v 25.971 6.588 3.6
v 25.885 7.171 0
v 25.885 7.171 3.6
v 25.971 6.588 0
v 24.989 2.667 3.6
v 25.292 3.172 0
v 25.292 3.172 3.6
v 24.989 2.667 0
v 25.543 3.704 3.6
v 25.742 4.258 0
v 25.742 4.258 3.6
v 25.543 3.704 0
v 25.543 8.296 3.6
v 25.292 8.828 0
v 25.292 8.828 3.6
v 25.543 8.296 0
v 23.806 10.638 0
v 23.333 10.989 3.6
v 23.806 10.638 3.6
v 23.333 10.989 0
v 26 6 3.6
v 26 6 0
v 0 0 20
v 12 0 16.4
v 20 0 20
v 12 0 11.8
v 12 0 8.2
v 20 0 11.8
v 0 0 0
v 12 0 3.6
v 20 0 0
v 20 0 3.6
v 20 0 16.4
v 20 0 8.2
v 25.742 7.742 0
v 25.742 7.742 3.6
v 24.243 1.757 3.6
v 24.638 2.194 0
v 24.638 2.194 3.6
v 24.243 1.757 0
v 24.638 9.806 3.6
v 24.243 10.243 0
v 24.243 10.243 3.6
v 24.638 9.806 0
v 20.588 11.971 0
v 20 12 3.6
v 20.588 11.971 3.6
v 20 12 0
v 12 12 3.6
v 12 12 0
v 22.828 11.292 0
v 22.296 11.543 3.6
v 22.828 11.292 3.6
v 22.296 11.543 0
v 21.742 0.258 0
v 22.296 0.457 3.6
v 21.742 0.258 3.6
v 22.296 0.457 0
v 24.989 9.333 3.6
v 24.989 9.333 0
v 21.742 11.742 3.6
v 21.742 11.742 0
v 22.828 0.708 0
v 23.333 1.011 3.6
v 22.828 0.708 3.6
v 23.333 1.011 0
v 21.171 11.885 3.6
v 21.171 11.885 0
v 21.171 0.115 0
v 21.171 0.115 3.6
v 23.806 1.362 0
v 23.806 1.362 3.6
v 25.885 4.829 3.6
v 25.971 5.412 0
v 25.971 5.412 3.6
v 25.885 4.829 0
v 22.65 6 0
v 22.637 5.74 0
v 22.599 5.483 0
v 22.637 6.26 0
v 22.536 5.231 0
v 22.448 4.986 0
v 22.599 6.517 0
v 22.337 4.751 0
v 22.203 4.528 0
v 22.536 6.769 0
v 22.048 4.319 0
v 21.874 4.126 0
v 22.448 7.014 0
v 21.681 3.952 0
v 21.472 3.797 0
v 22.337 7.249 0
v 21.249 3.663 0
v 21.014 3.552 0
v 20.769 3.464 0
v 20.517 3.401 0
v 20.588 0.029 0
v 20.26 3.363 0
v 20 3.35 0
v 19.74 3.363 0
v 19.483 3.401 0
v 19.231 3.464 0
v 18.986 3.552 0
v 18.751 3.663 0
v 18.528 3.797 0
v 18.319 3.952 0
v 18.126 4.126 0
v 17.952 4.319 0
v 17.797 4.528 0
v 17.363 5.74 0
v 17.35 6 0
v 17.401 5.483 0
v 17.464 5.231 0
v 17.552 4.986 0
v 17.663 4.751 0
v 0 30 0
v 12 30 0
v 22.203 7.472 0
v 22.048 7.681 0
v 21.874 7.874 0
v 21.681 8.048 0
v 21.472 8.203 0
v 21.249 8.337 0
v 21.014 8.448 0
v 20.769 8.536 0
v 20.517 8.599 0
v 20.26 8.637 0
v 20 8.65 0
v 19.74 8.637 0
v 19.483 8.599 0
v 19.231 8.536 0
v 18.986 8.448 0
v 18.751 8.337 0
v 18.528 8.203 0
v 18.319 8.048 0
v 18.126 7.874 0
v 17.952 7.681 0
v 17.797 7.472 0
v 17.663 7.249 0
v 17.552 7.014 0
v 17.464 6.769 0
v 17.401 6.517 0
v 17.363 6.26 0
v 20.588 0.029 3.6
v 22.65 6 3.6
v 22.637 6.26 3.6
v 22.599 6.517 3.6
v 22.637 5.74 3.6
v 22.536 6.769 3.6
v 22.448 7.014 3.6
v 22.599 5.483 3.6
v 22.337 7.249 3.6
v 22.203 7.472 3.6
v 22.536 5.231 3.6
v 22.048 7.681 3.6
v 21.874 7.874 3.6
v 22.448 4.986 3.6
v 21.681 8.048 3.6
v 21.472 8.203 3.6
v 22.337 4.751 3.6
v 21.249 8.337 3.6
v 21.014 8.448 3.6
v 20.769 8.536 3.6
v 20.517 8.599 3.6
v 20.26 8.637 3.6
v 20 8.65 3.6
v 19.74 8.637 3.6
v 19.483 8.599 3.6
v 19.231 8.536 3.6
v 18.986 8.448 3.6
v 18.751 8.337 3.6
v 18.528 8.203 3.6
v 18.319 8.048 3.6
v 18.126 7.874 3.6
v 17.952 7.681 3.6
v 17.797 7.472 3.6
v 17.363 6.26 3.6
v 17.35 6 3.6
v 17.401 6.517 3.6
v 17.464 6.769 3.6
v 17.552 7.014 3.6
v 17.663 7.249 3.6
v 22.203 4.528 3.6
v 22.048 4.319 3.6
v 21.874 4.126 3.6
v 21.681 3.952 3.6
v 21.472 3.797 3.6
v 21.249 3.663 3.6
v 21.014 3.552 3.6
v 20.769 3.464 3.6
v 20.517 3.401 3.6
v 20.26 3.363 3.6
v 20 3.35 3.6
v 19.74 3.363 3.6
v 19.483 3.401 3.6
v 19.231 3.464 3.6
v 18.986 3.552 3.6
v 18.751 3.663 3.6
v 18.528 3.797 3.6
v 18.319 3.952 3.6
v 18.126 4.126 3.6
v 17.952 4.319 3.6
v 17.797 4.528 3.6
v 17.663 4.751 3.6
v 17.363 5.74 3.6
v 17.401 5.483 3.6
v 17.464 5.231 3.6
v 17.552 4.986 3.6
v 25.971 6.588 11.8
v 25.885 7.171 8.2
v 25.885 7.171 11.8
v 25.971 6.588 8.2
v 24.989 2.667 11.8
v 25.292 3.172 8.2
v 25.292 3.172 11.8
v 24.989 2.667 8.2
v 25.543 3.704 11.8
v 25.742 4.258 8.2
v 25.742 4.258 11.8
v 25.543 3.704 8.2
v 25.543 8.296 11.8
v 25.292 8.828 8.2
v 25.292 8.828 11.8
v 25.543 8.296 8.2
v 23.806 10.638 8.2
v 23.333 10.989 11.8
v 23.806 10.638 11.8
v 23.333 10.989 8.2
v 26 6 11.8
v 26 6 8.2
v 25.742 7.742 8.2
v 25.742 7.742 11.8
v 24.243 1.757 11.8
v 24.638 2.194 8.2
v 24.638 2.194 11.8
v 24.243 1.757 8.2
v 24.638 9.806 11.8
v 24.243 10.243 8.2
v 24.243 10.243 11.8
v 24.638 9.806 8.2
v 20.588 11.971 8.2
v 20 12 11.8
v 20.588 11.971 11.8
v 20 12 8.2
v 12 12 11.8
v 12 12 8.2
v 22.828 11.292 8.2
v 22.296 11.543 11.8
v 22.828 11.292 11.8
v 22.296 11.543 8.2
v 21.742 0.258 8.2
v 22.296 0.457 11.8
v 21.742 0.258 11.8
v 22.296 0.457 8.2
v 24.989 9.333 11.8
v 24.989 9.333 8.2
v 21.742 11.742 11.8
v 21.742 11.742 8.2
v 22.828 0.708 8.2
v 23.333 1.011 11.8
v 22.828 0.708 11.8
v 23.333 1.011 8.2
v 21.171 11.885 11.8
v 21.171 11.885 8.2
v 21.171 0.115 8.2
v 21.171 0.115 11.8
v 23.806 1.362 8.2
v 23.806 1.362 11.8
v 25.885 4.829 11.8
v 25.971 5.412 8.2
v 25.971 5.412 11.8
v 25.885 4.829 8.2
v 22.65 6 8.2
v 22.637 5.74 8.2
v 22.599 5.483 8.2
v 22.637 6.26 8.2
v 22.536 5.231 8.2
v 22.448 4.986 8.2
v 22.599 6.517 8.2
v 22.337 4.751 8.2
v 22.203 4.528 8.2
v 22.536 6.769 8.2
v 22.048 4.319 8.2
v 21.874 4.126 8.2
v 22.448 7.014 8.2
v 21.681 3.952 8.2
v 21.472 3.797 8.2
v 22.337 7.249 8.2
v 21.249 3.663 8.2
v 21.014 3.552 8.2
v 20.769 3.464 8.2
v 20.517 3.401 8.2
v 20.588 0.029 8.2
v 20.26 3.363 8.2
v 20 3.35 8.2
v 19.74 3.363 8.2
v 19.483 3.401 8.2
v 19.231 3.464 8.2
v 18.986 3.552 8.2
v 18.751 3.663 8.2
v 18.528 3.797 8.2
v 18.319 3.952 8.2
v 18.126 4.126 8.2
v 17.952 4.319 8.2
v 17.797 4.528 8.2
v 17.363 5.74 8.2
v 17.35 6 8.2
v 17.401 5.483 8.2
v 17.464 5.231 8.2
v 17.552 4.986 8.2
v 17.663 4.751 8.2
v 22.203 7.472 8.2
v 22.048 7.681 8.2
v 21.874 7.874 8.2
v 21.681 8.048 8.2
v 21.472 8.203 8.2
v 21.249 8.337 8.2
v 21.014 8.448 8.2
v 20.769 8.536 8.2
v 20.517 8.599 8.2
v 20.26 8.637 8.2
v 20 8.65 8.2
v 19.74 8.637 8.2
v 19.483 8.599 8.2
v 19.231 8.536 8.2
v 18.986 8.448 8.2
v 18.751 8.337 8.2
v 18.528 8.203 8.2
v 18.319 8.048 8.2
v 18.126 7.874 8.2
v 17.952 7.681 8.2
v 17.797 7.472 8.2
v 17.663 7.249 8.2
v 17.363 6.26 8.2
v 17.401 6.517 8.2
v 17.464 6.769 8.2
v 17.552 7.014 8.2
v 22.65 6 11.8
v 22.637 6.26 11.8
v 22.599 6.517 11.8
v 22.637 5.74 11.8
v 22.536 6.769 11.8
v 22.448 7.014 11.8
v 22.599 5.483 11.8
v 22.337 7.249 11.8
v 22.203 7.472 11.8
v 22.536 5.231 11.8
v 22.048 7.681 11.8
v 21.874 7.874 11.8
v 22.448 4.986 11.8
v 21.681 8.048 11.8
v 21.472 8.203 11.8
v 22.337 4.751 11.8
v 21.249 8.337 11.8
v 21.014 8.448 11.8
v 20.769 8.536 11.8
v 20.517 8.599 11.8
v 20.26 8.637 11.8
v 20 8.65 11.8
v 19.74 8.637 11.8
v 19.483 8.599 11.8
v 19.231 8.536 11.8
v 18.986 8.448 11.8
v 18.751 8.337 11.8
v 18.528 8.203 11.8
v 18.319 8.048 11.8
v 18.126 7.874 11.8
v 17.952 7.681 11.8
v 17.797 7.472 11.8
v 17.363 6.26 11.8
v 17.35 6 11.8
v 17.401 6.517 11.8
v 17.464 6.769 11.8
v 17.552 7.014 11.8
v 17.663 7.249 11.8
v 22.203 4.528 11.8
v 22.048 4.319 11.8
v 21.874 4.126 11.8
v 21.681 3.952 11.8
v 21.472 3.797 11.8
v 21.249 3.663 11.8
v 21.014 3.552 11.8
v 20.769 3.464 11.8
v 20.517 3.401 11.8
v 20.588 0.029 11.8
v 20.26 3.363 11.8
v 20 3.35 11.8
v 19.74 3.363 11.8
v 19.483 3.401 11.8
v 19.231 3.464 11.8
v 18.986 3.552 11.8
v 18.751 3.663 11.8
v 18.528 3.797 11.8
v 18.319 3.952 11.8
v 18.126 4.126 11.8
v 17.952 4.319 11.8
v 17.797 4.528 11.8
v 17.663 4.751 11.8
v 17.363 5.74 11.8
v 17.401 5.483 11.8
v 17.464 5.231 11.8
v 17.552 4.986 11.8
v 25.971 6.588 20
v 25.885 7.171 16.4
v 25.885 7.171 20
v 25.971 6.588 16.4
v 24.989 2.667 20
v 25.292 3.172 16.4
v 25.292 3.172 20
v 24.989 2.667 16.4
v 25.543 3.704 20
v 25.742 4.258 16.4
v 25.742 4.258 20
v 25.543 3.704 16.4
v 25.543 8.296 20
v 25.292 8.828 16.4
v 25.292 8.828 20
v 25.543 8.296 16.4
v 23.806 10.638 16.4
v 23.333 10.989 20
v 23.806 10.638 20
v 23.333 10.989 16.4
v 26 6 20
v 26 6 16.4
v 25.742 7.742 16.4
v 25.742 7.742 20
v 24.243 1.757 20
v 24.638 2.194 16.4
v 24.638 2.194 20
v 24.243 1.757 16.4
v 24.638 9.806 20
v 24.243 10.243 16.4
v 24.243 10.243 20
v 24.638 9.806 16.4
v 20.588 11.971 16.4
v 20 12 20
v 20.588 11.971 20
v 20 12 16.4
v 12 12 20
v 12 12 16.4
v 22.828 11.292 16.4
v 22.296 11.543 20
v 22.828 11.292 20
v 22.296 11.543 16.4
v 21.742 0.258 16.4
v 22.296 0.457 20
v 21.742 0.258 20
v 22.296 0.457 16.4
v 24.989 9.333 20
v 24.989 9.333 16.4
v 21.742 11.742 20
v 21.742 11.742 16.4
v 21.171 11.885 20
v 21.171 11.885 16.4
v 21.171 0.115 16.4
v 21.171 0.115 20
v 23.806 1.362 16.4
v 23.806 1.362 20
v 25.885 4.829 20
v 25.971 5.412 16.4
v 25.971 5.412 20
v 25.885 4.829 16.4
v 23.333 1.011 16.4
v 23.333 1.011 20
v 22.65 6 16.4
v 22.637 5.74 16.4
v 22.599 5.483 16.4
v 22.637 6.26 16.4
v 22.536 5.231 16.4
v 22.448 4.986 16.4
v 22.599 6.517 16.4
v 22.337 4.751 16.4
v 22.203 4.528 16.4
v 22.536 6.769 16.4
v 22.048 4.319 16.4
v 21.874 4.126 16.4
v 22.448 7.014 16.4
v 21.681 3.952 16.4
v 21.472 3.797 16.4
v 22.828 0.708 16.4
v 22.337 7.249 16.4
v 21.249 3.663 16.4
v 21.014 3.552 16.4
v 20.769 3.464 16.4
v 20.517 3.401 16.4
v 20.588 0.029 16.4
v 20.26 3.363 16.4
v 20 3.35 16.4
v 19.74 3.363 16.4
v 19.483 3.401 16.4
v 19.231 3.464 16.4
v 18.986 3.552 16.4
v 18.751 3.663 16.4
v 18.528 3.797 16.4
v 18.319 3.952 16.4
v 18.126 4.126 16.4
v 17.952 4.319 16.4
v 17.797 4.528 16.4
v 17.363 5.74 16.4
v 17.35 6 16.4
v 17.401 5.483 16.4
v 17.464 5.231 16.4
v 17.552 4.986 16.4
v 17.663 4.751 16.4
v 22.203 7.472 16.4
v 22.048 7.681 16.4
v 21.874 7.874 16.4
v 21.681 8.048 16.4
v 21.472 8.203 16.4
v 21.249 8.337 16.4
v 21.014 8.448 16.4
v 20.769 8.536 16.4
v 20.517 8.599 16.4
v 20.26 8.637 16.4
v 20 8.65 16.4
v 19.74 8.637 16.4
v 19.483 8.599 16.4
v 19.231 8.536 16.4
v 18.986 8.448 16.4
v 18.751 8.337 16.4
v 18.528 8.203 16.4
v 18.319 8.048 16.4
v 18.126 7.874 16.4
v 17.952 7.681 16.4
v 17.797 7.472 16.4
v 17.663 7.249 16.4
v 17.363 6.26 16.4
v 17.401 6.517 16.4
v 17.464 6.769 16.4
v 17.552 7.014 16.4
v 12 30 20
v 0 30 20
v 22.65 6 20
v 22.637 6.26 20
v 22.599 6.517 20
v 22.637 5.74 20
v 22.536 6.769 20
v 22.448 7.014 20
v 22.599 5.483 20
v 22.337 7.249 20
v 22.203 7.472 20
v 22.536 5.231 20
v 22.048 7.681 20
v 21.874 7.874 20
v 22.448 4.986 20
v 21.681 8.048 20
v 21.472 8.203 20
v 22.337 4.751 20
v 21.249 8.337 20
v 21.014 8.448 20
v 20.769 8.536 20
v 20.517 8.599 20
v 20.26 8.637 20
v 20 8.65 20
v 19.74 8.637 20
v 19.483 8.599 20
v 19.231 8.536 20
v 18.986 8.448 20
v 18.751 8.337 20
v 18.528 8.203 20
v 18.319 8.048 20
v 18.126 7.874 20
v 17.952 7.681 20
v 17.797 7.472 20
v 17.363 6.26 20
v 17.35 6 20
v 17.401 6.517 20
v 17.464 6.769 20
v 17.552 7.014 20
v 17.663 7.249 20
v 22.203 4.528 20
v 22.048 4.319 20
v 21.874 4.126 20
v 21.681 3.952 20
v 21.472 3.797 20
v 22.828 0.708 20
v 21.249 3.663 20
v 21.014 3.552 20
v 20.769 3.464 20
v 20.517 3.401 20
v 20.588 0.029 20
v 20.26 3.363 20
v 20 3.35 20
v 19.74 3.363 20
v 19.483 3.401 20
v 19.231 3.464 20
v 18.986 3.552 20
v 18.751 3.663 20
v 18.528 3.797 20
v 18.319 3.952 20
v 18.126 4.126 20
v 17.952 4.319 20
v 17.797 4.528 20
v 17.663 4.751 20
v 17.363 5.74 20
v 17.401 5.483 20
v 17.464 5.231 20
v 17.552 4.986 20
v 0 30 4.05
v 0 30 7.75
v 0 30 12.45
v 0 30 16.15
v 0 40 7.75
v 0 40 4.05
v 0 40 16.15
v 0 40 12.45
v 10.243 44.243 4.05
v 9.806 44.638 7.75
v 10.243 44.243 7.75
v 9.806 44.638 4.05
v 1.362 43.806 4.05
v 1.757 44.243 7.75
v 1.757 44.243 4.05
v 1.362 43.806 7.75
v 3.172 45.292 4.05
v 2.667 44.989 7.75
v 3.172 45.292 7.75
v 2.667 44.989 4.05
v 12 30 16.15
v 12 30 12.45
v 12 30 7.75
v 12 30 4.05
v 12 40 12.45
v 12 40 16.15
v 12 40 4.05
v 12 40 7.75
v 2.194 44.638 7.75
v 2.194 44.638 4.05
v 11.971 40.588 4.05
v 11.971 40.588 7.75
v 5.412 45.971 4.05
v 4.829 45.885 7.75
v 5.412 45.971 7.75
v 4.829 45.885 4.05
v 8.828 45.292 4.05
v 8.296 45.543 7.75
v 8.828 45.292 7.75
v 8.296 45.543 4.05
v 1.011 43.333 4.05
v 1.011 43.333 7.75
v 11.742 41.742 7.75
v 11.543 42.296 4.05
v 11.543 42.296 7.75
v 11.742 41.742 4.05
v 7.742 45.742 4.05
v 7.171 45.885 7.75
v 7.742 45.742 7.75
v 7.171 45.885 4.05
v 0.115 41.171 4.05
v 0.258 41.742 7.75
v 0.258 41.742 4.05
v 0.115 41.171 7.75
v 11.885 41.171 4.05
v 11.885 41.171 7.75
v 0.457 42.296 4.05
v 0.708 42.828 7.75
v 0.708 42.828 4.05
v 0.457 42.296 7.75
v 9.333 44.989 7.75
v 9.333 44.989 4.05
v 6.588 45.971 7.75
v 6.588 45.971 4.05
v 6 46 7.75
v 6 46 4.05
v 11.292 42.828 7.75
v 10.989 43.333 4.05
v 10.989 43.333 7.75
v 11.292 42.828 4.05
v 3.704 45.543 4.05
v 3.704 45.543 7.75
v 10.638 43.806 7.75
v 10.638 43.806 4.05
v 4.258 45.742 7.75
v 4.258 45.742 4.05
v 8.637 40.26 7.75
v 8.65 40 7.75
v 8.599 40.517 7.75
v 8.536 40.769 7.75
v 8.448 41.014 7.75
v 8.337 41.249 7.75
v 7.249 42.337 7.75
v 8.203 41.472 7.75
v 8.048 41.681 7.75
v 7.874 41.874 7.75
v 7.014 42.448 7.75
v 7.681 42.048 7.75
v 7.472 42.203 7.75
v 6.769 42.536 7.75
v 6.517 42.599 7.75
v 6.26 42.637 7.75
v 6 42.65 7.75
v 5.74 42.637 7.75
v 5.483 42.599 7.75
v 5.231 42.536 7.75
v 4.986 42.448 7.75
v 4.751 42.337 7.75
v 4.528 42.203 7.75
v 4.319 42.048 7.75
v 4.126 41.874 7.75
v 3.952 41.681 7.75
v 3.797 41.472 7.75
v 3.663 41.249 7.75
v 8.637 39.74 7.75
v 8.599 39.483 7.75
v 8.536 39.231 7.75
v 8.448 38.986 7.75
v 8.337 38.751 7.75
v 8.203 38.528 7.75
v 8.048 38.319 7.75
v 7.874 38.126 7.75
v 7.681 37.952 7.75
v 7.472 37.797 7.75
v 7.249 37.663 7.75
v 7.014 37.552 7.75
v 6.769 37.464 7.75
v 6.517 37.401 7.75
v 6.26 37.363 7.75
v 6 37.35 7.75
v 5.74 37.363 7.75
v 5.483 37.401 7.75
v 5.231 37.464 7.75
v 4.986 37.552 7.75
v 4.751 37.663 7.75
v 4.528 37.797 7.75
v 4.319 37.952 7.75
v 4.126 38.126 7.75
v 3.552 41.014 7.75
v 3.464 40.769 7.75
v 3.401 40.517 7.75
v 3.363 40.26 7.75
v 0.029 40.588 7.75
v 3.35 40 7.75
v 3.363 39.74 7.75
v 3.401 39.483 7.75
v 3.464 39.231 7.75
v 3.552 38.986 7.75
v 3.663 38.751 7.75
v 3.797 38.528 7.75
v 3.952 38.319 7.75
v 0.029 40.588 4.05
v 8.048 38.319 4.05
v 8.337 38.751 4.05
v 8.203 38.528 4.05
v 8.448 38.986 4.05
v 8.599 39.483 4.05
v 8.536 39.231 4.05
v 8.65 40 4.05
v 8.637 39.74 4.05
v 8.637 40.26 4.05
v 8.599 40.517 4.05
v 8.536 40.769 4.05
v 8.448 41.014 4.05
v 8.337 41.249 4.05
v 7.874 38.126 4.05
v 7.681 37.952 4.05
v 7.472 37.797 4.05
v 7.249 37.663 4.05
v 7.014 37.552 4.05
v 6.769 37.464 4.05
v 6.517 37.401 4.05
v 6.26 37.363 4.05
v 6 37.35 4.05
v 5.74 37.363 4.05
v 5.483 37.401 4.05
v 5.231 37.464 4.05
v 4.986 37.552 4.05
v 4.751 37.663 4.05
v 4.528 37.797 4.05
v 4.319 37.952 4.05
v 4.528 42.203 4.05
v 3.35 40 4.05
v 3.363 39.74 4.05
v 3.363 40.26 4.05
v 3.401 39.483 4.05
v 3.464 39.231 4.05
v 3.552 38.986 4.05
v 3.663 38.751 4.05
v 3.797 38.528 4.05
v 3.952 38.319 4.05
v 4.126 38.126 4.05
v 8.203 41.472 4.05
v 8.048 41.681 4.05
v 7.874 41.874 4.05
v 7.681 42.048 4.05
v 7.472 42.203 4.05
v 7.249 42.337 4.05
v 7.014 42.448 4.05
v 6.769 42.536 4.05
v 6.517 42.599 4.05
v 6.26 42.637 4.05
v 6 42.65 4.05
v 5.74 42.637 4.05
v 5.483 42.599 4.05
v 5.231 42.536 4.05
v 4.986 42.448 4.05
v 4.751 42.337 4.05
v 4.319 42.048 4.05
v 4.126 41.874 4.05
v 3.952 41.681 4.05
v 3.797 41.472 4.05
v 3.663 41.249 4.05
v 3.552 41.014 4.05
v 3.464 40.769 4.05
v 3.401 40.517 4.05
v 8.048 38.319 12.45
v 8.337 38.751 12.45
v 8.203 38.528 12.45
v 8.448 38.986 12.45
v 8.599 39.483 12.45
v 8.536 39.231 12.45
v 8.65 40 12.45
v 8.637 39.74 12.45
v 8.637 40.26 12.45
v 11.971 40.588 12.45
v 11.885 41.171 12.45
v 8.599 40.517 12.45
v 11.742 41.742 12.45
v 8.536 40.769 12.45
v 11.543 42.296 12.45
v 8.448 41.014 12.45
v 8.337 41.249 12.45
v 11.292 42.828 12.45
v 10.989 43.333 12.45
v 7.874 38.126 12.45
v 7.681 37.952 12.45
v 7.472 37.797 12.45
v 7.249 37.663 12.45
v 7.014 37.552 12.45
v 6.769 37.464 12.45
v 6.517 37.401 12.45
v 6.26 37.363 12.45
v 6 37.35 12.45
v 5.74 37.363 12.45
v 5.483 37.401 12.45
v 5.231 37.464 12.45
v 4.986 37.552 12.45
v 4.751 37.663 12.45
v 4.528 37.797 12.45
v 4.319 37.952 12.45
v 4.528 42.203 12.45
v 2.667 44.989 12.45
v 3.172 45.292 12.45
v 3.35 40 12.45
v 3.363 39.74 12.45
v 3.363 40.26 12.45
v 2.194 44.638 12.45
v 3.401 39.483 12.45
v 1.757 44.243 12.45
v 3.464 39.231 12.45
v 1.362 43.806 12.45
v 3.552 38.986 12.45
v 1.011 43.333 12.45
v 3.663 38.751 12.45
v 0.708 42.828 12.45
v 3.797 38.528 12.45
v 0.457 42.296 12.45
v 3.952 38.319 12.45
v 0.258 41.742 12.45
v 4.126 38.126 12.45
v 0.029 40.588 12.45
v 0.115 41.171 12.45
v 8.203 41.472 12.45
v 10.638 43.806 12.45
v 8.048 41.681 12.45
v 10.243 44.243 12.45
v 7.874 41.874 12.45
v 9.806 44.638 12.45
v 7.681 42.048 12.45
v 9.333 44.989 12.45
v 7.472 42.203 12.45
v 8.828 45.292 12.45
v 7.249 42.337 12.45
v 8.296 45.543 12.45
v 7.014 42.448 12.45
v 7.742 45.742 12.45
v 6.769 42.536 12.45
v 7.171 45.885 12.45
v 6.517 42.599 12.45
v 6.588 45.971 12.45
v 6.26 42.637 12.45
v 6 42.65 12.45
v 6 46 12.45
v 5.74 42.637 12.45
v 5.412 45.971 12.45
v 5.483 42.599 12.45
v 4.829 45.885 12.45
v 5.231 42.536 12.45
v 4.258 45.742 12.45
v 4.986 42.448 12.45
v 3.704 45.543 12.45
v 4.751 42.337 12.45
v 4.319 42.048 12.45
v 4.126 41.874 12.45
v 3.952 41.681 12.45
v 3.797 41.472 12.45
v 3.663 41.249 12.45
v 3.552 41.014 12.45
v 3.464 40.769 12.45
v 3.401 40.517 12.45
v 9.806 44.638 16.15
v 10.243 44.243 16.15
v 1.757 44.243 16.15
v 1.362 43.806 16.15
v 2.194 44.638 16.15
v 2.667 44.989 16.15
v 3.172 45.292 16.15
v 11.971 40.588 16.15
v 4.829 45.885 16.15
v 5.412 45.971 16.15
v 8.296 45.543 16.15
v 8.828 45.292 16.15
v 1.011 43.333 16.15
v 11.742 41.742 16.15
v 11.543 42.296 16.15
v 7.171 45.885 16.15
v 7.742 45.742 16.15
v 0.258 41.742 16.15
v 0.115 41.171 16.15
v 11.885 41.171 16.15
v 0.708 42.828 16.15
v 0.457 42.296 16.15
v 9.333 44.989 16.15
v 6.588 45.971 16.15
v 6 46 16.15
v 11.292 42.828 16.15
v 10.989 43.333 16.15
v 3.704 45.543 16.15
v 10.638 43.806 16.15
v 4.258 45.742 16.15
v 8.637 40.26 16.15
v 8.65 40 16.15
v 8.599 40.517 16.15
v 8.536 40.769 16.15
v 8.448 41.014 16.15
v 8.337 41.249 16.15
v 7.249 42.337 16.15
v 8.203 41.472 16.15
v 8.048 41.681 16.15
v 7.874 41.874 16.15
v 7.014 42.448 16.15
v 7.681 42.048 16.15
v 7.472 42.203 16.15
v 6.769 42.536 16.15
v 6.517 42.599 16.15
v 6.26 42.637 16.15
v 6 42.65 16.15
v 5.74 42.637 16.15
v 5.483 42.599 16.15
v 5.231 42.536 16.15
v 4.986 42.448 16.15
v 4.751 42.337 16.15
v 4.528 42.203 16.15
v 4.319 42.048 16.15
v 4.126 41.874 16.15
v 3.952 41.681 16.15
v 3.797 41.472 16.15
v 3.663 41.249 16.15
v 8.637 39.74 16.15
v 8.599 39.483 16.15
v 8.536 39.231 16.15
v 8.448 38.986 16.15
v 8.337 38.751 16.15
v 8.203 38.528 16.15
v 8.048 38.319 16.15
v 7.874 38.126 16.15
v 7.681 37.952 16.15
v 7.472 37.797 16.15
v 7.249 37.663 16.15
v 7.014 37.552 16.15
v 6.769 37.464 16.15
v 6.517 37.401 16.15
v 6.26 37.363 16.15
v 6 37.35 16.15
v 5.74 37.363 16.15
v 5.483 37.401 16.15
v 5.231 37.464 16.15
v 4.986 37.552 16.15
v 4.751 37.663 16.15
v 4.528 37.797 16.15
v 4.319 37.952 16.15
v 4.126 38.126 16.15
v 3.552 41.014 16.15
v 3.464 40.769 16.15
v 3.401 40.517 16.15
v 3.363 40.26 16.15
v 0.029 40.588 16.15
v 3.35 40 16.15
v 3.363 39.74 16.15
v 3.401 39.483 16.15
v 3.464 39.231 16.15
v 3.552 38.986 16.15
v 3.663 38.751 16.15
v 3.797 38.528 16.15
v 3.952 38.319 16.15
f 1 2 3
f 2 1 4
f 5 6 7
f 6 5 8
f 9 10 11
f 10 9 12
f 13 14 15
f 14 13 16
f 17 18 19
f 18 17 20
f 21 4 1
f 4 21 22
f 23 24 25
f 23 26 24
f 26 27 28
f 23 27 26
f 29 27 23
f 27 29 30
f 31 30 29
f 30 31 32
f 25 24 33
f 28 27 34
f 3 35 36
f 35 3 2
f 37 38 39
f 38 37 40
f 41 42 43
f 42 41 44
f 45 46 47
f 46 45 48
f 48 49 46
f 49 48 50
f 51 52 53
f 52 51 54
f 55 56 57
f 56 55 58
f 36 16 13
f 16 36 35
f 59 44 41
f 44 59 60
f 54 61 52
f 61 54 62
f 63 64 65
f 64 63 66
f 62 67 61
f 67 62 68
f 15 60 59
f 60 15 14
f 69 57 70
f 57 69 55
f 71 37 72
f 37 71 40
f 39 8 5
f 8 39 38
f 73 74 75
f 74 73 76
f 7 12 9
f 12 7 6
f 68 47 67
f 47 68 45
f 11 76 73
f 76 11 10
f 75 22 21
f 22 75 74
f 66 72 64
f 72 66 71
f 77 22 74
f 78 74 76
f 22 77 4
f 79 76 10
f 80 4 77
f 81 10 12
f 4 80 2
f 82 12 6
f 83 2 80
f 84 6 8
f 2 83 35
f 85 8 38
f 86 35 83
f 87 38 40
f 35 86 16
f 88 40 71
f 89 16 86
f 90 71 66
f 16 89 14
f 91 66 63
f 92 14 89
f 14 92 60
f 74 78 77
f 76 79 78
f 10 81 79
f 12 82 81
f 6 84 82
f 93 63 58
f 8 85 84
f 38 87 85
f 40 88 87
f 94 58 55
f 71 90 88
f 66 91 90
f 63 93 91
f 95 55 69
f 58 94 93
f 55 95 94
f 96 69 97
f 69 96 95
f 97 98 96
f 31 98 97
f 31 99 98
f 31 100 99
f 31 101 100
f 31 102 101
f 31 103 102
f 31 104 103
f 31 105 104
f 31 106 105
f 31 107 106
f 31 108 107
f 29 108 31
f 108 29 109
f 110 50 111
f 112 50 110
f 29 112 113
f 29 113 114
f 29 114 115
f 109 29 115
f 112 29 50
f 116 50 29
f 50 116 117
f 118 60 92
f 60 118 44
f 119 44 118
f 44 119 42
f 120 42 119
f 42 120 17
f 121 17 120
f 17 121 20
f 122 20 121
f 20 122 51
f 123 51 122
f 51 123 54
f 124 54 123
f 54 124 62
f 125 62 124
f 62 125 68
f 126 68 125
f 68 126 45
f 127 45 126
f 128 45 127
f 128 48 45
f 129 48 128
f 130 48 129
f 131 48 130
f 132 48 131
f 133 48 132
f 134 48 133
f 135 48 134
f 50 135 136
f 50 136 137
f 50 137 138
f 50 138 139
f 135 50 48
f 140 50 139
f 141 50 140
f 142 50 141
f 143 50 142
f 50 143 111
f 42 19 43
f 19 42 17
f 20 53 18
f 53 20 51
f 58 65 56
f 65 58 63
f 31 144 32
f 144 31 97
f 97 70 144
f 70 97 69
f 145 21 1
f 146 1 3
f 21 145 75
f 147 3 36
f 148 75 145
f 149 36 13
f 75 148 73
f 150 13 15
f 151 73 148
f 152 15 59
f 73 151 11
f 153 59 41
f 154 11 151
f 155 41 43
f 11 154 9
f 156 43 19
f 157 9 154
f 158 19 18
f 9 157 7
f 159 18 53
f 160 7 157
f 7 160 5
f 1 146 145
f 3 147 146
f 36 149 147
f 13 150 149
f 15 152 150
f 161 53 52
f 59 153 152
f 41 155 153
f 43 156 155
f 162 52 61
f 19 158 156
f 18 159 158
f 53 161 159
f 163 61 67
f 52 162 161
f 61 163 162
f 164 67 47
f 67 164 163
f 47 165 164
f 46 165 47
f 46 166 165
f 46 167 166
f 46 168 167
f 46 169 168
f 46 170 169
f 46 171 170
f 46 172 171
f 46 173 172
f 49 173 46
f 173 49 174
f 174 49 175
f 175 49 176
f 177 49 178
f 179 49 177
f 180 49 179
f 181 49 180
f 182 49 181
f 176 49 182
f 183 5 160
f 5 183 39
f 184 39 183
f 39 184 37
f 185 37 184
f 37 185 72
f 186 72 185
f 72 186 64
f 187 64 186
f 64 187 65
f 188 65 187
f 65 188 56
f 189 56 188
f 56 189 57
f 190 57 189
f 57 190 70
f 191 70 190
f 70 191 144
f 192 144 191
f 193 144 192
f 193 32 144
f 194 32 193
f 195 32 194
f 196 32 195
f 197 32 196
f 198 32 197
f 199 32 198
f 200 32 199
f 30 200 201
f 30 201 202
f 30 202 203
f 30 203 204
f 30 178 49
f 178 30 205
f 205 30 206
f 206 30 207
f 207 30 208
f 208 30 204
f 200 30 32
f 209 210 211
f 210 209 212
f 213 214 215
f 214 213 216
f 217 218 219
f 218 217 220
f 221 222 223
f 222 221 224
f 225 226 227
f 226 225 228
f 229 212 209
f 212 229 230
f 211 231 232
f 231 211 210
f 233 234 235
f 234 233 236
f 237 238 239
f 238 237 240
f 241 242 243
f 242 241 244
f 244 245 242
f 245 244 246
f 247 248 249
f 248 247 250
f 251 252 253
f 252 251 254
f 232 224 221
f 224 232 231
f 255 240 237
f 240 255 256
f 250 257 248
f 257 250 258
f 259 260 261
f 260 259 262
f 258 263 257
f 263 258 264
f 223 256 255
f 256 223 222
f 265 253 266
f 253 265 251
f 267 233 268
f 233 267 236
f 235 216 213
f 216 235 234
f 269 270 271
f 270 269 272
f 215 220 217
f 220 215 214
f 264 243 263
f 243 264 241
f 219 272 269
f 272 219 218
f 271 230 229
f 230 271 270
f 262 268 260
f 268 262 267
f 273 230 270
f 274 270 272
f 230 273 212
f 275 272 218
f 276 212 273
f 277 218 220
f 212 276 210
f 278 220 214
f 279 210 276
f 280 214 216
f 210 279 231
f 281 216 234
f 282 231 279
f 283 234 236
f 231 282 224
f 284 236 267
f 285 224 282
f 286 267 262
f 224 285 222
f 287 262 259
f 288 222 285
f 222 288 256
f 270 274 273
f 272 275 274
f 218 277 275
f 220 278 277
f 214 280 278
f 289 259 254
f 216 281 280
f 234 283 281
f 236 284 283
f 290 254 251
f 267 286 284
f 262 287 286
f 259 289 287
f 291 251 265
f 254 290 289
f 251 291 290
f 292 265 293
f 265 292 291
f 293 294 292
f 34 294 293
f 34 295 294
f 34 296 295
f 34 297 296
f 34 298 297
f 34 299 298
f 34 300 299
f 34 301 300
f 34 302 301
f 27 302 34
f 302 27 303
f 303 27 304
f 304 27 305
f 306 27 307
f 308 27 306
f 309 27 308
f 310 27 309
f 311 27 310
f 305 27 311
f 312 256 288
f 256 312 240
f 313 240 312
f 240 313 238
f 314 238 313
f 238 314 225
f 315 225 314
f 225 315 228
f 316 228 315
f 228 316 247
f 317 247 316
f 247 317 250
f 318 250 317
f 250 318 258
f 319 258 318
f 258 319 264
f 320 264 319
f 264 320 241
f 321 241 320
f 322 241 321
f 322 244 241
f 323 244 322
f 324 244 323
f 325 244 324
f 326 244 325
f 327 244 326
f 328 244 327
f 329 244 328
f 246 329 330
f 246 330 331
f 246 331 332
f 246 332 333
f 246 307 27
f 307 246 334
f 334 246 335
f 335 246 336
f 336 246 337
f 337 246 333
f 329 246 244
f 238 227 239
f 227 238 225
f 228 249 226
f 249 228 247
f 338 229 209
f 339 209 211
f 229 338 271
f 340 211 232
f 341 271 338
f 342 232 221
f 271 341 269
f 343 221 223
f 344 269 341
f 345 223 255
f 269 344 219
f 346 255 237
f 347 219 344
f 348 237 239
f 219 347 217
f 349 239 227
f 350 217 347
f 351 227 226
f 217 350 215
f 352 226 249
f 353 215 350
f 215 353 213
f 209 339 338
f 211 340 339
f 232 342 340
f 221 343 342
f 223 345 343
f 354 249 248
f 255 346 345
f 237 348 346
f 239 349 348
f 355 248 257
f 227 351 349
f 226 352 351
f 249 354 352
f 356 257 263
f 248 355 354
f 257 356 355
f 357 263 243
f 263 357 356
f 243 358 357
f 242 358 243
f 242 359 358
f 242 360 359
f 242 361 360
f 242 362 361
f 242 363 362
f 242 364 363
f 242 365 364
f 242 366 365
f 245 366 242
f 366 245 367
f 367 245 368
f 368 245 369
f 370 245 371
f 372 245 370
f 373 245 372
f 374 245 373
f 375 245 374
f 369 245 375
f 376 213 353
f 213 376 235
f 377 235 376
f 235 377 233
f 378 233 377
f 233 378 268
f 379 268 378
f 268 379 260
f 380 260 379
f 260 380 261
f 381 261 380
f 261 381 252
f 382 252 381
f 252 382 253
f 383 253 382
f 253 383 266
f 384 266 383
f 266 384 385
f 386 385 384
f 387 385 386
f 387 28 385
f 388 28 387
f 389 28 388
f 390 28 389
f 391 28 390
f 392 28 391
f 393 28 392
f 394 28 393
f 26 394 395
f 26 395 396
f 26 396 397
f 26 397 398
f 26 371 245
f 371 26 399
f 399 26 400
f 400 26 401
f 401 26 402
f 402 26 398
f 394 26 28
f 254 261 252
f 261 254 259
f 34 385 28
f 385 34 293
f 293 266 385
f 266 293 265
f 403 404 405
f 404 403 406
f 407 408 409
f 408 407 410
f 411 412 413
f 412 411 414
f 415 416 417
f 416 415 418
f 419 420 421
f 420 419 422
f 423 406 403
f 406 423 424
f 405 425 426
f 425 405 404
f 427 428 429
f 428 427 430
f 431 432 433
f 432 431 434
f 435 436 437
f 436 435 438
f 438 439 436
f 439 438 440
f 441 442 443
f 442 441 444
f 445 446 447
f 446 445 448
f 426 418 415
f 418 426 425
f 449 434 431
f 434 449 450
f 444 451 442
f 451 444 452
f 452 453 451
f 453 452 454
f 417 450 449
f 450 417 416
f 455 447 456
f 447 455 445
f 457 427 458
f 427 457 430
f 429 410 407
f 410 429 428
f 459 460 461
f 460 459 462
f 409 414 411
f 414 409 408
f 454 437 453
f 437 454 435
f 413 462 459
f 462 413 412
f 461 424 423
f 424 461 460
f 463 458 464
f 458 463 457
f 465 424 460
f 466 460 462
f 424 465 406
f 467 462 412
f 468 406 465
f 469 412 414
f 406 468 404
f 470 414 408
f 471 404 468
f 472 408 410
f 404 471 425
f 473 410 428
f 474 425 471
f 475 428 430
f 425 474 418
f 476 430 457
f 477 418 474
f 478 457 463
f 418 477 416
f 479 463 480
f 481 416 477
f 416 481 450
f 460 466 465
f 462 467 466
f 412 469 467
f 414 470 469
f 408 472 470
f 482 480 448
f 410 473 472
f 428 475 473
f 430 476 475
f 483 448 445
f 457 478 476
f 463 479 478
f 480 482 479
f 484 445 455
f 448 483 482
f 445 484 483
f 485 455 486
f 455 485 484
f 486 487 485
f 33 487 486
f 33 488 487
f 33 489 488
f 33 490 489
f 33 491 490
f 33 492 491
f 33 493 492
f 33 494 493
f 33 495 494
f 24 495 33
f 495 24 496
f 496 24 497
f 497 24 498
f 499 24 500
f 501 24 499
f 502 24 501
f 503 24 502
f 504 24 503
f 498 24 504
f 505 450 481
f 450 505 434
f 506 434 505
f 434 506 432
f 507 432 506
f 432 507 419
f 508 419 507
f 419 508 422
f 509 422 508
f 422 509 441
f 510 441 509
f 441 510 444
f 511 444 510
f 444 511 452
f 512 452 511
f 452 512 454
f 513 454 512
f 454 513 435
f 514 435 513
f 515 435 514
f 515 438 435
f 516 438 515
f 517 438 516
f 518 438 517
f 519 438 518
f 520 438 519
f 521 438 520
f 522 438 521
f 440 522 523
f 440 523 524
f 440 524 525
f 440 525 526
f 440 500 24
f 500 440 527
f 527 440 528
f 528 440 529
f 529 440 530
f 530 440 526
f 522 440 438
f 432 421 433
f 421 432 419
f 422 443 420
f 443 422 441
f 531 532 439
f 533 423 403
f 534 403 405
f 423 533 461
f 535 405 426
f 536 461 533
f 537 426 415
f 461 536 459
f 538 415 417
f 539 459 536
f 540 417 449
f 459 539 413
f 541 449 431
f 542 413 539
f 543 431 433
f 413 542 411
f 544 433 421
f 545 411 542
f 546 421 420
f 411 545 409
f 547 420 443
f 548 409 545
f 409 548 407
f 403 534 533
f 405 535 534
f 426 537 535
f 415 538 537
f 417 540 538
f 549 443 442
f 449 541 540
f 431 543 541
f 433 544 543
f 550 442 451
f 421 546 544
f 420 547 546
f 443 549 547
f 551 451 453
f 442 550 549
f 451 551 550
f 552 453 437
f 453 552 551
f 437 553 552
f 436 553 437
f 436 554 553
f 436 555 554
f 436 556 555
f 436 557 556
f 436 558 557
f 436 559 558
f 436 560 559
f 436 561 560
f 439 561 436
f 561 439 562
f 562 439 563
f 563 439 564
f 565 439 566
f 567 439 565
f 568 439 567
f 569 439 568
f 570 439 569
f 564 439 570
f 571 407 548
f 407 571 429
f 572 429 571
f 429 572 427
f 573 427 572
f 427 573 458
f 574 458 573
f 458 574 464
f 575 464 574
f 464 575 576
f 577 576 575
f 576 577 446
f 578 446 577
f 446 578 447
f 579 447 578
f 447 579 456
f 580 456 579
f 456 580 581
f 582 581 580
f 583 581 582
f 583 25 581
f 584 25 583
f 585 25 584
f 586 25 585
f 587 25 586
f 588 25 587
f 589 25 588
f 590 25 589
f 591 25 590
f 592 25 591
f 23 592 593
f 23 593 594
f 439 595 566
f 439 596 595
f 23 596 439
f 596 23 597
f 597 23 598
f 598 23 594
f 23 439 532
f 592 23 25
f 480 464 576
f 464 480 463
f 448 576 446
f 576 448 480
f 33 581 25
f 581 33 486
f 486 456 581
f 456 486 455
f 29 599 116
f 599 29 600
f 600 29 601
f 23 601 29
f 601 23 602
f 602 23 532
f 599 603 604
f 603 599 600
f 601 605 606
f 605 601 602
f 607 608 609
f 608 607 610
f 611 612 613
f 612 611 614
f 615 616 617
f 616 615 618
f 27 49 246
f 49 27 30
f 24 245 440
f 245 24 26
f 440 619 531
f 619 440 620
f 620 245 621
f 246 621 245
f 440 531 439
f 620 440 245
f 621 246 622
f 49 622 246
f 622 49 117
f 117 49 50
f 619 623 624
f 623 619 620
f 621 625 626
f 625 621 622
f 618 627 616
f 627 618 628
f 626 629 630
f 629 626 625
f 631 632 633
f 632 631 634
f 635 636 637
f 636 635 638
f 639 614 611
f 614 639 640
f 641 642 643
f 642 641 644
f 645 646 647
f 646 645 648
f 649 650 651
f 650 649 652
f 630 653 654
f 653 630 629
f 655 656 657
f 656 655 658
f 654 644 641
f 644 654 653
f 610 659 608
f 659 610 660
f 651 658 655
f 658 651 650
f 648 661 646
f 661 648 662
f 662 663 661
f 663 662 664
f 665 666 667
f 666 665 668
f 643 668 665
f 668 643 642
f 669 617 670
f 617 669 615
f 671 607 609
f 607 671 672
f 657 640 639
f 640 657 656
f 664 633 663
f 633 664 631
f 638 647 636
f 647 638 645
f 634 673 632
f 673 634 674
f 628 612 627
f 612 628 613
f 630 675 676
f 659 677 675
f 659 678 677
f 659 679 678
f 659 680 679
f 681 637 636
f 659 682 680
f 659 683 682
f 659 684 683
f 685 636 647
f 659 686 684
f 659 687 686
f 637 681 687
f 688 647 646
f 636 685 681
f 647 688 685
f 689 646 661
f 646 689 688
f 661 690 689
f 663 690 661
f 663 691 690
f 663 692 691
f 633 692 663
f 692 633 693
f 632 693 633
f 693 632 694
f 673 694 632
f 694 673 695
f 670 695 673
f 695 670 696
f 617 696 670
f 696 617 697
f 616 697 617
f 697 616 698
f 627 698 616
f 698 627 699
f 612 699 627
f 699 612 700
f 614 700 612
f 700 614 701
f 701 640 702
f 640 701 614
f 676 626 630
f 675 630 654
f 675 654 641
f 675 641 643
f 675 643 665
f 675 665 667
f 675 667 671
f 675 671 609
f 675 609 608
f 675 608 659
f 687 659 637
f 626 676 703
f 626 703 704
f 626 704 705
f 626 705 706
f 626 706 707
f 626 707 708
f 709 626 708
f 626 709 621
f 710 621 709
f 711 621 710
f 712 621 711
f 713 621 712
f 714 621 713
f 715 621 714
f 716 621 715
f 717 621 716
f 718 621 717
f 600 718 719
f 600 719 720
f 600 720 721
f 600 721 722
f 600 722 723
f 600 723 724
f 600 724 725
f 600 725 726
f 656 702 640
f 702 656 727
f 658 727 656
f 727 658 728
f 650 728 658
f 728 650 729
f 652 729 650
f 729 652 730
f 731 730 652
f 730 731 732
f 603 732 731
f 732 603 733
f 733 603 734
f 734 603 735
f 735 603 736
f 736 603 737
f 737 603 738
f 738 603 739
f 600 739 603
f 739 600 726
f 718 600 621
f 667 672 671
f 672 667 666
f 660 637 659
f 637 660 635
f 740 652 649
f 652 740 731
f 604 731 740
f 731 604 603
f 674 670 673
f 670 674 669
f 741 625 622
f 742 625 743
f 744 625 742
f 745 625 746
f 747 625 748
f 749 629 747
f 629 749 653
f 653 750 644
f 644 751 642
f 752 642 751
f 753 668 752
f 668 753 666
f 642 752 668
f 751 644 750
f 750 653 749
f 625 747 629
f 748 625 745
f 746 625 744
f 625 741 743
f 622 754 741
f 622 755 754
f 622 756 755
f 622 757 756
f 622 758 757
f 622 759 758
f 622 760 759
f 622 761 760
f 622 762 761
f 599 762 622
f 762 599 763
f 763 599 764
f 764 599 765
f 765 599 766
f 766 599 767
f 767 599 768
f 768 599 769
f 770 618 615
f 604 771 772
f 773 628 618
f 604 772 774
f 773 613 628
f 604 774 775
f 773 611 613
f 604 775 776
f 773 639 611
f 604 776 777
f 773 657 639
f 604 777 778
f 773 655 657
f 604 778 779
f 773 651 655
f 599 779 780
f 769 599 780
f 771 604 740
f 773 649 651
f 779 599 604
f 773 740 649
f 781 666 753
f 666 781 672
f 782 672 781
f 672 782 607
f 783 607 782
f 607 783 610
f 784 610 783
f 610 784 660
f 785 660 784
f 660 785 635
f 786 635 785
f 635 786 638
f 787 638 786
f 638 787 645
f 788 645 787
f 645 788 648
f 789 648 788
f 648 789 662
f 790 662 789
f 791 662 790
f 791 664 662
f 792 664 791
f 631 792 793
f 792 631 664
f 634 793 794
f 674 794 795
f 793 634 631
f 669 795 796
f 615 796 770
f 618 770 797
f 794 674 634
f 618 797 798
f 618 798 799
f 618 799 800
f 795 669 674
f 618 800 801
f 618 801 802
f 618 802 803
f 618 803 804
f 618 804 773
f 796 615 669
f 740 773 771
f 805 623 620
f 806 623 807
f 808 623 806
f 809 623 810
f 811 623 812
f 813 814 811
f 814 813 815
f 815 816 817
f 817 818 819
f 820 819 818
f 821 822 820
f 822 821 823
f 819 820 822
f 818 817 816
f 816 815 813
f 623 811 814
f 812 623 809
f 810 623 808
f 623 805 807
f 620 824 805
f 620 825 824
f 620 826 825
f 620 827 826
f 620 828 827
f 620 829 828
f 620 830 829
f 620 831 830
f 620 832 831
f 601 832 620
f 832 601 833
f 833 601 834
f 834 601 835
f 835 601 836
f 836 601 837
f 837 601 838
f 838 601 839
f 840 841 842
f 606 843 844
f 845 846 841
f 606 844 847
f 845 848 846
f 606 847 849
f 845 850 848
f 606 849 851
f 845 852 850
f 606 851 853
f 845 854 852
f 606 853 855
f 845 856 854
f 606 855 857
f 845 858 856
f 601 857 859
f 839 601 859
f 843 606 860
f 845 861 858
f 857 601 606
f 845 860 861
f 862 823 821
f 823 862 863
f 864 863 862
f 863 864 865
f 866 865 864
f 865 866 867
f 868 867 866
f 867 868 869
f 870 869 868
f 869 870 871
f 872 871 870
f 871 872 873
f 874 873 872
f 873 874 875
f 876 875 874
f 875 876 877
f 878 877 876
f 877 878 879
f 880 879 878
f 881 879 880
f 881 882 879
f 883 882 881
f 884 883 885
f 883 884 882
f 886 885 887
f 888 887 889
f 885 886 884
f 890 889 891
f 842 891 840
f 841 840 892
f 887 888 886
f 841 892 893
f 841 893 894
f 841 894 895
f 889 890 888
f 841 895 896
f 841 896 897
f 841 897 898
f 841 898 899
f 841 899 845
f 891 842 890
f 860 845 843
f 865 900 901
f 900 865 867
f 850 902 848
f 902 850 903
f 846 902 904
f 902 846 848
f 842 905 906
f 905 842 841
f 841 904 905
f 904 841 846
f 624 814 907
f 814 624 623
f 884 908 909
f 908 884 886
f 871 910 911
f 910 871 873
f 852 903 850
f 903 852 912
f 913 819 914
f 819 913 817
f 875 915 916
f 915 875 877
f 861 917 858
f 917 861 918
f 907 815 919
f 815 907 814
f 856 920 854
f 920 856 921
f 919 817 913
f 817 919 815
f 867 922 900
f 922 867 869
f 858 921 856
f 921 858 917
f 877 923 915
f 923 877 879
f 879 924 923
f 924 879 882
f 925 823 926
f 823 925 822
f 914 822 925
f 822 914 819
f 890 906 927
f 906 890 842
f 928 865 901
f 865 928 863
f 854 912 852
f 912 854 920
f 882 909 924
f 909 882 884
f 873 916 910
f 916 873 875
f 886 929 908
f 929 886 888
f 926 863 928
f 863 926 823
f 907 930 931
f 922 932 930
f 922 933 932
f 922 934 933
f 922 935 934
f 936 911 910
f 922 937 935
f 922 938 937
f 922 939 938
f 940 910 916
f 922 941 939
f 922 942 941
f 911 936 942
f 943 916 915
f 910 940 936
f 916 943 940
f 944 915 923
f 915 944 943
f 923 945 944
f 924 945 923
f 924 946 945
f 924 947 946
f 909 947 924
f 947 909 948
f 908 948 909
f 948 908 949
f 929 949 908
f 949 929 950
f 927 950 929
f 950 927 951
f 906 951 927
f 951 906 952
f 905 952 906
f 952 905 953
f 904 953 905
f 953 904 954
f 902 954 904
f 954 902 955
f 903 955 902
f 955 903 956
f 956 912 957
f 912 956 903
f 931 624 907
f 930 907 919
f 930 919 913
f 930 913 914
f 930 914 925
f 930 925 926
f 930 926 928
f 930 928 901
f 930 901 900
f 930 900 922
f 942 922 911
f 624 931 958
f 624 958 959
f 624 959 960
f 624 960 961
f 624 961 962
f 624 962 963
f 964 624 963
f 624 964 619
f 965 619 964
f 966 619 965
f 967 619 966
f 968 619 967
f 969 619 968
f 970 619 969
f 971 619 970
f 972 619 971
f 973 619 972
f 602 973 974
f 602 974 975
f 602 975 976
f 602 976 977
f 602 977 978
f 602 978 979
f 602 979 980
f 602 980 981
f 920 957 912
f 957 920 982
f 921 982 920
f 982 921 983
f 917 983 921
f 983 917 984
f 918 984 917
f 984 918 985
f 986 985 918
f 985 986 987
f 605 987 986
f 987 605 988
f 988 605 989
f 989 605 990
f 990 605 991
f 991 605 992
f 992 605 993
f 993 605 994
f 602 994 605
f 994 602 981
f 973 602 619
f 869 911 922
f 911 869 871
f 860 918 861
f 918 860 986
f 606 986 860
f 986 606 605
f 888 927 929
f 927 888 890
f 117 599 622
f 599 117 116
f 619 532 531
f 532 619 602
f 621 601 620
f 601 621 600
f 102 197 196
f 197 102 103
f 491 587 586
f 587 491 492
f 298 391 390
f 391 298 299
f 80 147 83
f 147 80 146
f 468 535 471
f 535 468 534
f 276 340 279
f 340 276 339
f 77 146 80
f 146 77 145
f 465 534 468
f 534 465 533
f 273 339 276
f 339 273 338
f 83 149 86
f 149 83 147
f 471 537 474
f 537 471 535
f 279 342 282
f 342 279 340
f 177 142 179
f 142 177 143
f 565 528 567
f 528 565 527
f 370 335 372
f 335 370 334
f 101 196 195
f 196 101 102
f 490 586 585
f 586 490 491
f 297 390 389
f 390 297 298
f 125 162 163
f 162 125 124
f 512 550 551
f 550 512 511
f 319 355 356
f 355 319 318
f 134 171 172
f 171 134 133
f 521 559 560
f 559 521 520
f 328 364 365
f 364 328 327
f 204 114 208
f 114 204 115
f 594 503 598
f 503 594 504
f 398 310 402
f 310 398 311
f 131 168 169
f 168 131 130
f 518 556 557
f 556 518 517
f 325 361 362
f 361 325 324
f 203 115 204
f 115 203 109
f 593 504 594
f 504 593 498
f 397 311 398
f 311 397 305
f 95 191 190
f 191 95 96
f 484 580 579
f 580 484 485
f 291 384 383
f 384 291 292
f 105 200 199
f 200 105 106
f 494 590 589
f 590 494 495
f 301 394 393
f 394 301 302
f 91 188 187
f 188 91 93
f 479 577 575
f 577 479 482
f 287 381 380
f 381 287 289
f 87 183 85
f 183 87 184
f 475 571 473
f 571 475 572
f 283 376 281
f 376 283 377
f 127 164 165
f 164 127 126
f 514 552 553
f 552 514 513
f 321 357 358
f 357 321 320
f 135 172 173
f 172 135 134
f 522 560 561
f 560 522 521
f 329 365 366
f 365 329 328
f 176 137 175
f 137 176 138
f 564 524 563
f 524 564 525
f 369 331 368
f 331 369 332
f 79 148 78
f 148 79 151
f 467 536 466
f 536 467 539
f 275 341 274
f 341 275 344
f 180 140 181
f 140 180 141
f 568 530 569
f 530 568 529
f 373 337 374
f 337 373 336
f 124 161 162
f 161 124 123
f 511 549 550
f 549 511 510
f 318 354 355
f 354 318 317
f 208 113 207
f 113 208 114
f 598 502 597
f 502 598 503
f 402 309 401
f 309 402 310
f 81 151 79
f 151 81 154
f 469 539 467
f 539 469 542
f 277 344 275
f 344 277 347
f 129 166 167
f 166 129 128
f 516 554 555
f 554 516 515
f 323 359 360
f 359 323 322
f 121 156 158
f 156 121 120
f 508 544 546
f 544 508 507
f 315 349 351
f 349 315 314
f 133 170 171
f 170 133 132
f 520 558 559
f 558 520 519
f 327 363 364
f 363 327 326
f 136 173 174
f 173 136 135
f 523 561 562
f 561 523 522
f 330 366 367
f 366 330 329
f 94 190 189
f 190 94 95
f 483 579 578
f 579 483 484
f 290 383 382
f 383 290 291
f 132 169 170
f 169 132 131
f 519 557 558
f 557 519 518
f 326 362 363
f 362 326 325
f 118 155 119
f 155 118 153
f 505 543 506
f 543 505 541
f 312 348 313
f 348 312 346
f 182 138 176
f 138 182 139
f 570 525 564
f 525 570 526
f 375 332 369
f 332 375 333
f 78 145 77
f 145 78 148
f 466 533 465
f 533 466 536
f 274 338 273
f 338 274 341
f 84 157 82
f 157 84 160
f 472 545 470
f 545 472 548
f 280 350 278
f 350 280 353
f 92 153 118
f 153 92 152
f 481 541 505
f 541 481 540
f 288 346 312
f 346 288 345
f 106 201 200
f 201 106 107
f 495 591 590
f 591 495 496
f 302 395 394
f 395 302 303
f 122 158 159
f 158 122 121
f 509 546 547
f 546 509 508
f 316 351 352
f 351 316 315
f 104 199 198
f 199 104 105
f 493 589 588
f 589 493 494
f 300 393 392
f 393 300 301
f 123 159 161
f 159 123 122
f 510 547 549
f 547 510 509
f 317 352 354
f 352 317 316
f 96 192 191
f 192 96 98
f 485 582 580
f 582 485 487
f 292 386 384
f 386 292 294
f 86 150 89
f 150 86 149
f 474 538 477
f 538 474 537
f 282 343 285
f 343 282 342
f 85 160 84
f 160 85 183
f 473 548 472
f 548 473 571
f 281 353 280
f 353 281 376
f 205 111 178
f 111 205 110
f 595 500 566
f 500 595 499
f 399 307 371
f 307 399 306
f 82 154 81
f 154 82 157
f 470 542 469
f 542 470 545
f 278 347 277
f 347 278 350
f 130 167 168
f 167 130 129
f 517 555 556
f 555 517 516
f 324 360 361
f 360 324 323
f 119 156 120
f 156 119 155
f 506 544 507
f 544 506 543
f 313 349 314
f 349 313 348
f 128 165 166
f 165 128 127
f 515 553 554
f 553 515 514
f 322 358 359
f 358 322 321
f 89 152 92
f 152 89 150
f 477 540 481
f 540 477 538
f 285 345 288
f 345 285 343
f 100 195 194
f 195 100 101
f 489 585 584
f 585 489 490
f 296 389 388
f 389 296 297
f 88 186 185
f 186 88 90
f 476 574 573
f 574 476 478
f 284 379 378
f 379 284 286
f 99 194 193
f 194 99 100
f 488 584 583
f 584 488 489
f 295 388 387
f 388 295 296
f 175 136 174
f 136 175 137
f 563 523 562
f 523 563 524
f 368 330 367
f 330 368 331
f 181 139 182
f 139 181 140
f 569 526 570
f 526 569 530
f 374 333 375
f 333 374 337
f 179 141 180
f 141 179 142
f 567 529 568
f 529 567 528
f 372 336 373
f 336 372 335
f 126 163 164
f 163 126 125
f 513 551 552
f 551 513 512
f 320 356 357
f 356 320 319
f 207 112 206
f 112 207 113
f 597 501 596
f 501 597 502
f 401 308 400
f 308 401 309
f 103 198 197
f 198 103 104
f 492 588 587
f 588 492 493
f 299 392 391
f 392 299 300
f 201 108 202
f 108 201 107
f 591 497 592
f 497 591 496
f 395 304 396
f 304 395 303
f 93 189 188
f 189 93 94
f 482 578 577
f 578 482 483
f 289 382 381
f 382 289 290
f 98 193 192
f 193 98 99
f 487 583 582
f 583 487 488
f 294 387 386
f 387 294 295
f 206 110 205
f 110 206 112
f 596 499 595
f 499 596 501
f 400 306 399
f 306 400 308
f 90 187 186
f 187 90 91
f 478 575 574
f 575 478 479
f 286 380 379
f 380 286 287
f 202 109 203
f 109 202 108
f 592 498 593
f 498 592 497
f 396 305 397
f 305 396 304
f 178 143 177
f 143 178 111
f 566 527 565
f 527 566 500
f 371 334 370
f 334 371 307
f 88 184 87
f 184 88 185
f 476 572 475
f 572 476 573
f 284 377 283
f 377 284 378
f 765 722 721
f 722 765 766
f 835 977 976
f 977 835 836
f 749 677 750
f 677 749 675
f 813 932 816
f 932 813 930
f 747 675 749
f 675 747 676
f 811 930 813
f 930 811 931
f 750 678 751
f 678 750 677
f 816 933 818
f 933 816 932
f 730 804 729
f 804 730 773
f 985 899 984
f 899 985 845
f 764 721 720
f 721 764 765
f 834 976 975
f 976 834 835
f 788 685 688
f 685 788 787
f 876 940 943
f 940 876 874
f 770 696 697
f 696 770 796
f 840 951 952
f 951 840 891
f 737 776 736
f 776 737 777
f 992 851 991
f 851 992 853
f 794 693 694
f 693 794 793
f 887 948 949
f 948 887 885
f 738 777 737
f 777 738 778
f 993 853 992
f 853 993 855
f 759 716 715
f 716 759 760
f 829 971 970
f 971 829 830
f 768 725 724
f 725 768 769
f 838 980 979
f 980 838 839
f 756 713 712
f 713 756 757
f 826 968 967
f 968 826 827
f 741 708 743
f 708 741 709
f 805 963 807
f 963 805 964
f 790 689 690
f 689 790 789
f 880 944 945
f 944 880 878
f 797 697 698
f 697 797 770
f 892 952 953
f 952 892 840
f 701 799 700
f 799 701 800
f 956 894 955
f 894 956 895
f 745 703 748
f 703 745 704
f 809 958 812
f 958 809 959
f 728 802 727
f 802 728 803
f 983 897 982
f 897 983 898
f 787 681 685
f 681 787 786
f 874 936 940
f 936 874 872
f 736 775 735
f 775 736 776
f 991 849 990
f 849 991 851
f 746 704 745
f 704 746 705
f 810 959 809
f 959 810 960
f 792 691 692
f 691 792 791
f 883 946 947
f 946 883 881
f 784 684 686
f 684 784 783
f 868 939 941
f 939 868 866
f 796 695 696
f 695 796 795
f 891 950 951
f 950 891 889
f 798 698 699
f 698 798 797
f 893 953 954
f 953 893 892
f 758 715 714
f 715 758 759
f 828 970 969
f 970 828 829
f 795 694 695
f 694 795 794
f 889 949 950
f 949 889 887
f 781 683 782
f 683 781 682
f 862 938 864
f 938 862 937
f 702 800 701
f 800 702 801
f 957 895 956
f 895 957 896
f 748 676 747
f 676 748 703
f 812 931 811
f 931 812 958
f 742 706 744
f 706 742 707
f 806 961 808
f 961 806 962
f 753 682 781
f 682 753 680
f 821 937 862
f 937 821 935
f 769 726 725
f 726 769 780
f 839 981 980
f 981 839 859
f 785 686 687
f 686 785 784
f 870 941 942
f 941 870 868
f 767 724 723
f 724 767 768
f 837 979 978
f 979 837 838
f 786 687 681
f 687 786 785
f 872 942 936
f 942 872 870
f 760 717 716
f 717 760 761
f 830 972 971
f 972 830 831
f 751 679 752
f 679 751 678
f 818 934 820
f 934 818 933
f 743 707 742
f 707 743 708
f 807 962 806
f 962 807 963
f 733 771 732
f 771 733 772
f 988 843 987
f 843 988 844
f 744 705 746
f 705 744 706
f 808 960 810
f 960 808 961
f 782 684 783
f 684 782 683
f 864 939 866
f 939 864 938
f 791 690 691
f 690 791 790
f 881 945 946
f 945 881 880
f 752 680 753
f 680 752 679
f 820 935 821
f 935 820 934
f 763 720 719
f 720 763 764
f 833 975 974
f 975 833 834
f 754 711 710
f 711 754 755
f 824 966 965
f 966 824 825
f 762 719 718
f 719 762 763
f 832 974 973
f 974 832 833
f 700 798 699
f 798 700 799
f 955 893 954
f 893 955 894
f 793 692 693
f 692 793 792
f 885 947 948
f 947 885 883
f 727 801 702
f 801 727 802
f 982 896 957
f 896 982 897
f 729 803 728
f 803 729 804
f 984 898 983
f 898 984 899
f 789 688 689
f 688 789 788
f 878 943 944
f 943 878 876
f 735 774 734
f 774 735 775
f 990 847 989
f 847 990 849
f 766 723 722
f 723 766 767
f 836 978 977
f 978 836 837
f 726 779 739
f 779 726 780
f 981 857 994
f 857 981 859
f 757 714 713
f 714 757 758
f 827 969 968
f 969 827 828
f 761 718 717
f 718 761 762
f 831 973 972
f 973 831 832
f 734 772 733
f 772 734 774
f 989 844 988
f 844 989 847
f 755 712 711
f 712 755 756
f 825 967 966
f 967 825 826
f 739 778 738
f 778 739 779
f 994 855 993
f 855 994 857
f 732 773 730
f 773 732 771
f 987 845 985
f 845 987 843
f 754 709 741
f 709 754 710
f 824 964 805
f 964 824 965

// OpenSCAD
/* Gelenkarm V1.1: universelles Winkelgelenk, mm.
30 mm langer / 10 mm kurzer Schenkel BIS ZUM ZINKENANSATZ.
Beide Enden desselben Teils passen ineinander (2er/3er Gabel).
*/
$fn=64;
lang_bis_zinken=30;
kurz_bis_zinken=10;
breite_schenkel=12;
gelenk_breite=20;
zinken_laenge=16;
loch_d=5.3;
spiel=0.45;
zinken_3_dicke=3.6;
zinken_2_dicke=3.7;
module zinken_rechts(h) {
  linear_extrude(height=h) hull() {
    translate([kurz_bis_zinken-0.1,0]) square([0.2,breite_schenkel]);
    translate([kurz_bis_zinken+zinken_laenge-breite_schenkel/2,breite_schenkel/2])
      circle(d=breite_schenkel);
  }
}
module zinken_oben(h) {
  linear_extrude(height=h) hull() {
    translate([0,lang_bis_zinken-0.1]) square([breite_schenkel,0.2]);
    translate([breite_schenkel/2,lang_bis_zinken+zinken_laenge-breite_schenkel/2])
      circle(d=breite_schenkel);
  }
}
difference() {
  union() {
    linear_extrude(height=gelenk_breite)
      union(){square([breite_schenkel,lang_bis_zinken]);
              square([kurz_bis_zinken,breite_schenkel]);}
    for(z=[0,8.2,16.4]) translate([0,0,z]) zinken_rechts(zinken_3_dicke);
    for(z=[3.6+spiel,12.0+spiel]) translate([0,0,z]) zinken_oben(zinken_2_dicke);
  }
  translate([kurz_bis_zinken+zinken_laenge-breite_schenkel/2,breite_schenkel/2,-1])
    cylinder(d=loch_d,h=gelenk_breite+2);
  translate([breite_schenkel/2,lang_bis_zinken+zinken_laenge-breite_schenkel/2,-1])
    cylinder(d=loch_d,h=gelenk_breite+2);
}
